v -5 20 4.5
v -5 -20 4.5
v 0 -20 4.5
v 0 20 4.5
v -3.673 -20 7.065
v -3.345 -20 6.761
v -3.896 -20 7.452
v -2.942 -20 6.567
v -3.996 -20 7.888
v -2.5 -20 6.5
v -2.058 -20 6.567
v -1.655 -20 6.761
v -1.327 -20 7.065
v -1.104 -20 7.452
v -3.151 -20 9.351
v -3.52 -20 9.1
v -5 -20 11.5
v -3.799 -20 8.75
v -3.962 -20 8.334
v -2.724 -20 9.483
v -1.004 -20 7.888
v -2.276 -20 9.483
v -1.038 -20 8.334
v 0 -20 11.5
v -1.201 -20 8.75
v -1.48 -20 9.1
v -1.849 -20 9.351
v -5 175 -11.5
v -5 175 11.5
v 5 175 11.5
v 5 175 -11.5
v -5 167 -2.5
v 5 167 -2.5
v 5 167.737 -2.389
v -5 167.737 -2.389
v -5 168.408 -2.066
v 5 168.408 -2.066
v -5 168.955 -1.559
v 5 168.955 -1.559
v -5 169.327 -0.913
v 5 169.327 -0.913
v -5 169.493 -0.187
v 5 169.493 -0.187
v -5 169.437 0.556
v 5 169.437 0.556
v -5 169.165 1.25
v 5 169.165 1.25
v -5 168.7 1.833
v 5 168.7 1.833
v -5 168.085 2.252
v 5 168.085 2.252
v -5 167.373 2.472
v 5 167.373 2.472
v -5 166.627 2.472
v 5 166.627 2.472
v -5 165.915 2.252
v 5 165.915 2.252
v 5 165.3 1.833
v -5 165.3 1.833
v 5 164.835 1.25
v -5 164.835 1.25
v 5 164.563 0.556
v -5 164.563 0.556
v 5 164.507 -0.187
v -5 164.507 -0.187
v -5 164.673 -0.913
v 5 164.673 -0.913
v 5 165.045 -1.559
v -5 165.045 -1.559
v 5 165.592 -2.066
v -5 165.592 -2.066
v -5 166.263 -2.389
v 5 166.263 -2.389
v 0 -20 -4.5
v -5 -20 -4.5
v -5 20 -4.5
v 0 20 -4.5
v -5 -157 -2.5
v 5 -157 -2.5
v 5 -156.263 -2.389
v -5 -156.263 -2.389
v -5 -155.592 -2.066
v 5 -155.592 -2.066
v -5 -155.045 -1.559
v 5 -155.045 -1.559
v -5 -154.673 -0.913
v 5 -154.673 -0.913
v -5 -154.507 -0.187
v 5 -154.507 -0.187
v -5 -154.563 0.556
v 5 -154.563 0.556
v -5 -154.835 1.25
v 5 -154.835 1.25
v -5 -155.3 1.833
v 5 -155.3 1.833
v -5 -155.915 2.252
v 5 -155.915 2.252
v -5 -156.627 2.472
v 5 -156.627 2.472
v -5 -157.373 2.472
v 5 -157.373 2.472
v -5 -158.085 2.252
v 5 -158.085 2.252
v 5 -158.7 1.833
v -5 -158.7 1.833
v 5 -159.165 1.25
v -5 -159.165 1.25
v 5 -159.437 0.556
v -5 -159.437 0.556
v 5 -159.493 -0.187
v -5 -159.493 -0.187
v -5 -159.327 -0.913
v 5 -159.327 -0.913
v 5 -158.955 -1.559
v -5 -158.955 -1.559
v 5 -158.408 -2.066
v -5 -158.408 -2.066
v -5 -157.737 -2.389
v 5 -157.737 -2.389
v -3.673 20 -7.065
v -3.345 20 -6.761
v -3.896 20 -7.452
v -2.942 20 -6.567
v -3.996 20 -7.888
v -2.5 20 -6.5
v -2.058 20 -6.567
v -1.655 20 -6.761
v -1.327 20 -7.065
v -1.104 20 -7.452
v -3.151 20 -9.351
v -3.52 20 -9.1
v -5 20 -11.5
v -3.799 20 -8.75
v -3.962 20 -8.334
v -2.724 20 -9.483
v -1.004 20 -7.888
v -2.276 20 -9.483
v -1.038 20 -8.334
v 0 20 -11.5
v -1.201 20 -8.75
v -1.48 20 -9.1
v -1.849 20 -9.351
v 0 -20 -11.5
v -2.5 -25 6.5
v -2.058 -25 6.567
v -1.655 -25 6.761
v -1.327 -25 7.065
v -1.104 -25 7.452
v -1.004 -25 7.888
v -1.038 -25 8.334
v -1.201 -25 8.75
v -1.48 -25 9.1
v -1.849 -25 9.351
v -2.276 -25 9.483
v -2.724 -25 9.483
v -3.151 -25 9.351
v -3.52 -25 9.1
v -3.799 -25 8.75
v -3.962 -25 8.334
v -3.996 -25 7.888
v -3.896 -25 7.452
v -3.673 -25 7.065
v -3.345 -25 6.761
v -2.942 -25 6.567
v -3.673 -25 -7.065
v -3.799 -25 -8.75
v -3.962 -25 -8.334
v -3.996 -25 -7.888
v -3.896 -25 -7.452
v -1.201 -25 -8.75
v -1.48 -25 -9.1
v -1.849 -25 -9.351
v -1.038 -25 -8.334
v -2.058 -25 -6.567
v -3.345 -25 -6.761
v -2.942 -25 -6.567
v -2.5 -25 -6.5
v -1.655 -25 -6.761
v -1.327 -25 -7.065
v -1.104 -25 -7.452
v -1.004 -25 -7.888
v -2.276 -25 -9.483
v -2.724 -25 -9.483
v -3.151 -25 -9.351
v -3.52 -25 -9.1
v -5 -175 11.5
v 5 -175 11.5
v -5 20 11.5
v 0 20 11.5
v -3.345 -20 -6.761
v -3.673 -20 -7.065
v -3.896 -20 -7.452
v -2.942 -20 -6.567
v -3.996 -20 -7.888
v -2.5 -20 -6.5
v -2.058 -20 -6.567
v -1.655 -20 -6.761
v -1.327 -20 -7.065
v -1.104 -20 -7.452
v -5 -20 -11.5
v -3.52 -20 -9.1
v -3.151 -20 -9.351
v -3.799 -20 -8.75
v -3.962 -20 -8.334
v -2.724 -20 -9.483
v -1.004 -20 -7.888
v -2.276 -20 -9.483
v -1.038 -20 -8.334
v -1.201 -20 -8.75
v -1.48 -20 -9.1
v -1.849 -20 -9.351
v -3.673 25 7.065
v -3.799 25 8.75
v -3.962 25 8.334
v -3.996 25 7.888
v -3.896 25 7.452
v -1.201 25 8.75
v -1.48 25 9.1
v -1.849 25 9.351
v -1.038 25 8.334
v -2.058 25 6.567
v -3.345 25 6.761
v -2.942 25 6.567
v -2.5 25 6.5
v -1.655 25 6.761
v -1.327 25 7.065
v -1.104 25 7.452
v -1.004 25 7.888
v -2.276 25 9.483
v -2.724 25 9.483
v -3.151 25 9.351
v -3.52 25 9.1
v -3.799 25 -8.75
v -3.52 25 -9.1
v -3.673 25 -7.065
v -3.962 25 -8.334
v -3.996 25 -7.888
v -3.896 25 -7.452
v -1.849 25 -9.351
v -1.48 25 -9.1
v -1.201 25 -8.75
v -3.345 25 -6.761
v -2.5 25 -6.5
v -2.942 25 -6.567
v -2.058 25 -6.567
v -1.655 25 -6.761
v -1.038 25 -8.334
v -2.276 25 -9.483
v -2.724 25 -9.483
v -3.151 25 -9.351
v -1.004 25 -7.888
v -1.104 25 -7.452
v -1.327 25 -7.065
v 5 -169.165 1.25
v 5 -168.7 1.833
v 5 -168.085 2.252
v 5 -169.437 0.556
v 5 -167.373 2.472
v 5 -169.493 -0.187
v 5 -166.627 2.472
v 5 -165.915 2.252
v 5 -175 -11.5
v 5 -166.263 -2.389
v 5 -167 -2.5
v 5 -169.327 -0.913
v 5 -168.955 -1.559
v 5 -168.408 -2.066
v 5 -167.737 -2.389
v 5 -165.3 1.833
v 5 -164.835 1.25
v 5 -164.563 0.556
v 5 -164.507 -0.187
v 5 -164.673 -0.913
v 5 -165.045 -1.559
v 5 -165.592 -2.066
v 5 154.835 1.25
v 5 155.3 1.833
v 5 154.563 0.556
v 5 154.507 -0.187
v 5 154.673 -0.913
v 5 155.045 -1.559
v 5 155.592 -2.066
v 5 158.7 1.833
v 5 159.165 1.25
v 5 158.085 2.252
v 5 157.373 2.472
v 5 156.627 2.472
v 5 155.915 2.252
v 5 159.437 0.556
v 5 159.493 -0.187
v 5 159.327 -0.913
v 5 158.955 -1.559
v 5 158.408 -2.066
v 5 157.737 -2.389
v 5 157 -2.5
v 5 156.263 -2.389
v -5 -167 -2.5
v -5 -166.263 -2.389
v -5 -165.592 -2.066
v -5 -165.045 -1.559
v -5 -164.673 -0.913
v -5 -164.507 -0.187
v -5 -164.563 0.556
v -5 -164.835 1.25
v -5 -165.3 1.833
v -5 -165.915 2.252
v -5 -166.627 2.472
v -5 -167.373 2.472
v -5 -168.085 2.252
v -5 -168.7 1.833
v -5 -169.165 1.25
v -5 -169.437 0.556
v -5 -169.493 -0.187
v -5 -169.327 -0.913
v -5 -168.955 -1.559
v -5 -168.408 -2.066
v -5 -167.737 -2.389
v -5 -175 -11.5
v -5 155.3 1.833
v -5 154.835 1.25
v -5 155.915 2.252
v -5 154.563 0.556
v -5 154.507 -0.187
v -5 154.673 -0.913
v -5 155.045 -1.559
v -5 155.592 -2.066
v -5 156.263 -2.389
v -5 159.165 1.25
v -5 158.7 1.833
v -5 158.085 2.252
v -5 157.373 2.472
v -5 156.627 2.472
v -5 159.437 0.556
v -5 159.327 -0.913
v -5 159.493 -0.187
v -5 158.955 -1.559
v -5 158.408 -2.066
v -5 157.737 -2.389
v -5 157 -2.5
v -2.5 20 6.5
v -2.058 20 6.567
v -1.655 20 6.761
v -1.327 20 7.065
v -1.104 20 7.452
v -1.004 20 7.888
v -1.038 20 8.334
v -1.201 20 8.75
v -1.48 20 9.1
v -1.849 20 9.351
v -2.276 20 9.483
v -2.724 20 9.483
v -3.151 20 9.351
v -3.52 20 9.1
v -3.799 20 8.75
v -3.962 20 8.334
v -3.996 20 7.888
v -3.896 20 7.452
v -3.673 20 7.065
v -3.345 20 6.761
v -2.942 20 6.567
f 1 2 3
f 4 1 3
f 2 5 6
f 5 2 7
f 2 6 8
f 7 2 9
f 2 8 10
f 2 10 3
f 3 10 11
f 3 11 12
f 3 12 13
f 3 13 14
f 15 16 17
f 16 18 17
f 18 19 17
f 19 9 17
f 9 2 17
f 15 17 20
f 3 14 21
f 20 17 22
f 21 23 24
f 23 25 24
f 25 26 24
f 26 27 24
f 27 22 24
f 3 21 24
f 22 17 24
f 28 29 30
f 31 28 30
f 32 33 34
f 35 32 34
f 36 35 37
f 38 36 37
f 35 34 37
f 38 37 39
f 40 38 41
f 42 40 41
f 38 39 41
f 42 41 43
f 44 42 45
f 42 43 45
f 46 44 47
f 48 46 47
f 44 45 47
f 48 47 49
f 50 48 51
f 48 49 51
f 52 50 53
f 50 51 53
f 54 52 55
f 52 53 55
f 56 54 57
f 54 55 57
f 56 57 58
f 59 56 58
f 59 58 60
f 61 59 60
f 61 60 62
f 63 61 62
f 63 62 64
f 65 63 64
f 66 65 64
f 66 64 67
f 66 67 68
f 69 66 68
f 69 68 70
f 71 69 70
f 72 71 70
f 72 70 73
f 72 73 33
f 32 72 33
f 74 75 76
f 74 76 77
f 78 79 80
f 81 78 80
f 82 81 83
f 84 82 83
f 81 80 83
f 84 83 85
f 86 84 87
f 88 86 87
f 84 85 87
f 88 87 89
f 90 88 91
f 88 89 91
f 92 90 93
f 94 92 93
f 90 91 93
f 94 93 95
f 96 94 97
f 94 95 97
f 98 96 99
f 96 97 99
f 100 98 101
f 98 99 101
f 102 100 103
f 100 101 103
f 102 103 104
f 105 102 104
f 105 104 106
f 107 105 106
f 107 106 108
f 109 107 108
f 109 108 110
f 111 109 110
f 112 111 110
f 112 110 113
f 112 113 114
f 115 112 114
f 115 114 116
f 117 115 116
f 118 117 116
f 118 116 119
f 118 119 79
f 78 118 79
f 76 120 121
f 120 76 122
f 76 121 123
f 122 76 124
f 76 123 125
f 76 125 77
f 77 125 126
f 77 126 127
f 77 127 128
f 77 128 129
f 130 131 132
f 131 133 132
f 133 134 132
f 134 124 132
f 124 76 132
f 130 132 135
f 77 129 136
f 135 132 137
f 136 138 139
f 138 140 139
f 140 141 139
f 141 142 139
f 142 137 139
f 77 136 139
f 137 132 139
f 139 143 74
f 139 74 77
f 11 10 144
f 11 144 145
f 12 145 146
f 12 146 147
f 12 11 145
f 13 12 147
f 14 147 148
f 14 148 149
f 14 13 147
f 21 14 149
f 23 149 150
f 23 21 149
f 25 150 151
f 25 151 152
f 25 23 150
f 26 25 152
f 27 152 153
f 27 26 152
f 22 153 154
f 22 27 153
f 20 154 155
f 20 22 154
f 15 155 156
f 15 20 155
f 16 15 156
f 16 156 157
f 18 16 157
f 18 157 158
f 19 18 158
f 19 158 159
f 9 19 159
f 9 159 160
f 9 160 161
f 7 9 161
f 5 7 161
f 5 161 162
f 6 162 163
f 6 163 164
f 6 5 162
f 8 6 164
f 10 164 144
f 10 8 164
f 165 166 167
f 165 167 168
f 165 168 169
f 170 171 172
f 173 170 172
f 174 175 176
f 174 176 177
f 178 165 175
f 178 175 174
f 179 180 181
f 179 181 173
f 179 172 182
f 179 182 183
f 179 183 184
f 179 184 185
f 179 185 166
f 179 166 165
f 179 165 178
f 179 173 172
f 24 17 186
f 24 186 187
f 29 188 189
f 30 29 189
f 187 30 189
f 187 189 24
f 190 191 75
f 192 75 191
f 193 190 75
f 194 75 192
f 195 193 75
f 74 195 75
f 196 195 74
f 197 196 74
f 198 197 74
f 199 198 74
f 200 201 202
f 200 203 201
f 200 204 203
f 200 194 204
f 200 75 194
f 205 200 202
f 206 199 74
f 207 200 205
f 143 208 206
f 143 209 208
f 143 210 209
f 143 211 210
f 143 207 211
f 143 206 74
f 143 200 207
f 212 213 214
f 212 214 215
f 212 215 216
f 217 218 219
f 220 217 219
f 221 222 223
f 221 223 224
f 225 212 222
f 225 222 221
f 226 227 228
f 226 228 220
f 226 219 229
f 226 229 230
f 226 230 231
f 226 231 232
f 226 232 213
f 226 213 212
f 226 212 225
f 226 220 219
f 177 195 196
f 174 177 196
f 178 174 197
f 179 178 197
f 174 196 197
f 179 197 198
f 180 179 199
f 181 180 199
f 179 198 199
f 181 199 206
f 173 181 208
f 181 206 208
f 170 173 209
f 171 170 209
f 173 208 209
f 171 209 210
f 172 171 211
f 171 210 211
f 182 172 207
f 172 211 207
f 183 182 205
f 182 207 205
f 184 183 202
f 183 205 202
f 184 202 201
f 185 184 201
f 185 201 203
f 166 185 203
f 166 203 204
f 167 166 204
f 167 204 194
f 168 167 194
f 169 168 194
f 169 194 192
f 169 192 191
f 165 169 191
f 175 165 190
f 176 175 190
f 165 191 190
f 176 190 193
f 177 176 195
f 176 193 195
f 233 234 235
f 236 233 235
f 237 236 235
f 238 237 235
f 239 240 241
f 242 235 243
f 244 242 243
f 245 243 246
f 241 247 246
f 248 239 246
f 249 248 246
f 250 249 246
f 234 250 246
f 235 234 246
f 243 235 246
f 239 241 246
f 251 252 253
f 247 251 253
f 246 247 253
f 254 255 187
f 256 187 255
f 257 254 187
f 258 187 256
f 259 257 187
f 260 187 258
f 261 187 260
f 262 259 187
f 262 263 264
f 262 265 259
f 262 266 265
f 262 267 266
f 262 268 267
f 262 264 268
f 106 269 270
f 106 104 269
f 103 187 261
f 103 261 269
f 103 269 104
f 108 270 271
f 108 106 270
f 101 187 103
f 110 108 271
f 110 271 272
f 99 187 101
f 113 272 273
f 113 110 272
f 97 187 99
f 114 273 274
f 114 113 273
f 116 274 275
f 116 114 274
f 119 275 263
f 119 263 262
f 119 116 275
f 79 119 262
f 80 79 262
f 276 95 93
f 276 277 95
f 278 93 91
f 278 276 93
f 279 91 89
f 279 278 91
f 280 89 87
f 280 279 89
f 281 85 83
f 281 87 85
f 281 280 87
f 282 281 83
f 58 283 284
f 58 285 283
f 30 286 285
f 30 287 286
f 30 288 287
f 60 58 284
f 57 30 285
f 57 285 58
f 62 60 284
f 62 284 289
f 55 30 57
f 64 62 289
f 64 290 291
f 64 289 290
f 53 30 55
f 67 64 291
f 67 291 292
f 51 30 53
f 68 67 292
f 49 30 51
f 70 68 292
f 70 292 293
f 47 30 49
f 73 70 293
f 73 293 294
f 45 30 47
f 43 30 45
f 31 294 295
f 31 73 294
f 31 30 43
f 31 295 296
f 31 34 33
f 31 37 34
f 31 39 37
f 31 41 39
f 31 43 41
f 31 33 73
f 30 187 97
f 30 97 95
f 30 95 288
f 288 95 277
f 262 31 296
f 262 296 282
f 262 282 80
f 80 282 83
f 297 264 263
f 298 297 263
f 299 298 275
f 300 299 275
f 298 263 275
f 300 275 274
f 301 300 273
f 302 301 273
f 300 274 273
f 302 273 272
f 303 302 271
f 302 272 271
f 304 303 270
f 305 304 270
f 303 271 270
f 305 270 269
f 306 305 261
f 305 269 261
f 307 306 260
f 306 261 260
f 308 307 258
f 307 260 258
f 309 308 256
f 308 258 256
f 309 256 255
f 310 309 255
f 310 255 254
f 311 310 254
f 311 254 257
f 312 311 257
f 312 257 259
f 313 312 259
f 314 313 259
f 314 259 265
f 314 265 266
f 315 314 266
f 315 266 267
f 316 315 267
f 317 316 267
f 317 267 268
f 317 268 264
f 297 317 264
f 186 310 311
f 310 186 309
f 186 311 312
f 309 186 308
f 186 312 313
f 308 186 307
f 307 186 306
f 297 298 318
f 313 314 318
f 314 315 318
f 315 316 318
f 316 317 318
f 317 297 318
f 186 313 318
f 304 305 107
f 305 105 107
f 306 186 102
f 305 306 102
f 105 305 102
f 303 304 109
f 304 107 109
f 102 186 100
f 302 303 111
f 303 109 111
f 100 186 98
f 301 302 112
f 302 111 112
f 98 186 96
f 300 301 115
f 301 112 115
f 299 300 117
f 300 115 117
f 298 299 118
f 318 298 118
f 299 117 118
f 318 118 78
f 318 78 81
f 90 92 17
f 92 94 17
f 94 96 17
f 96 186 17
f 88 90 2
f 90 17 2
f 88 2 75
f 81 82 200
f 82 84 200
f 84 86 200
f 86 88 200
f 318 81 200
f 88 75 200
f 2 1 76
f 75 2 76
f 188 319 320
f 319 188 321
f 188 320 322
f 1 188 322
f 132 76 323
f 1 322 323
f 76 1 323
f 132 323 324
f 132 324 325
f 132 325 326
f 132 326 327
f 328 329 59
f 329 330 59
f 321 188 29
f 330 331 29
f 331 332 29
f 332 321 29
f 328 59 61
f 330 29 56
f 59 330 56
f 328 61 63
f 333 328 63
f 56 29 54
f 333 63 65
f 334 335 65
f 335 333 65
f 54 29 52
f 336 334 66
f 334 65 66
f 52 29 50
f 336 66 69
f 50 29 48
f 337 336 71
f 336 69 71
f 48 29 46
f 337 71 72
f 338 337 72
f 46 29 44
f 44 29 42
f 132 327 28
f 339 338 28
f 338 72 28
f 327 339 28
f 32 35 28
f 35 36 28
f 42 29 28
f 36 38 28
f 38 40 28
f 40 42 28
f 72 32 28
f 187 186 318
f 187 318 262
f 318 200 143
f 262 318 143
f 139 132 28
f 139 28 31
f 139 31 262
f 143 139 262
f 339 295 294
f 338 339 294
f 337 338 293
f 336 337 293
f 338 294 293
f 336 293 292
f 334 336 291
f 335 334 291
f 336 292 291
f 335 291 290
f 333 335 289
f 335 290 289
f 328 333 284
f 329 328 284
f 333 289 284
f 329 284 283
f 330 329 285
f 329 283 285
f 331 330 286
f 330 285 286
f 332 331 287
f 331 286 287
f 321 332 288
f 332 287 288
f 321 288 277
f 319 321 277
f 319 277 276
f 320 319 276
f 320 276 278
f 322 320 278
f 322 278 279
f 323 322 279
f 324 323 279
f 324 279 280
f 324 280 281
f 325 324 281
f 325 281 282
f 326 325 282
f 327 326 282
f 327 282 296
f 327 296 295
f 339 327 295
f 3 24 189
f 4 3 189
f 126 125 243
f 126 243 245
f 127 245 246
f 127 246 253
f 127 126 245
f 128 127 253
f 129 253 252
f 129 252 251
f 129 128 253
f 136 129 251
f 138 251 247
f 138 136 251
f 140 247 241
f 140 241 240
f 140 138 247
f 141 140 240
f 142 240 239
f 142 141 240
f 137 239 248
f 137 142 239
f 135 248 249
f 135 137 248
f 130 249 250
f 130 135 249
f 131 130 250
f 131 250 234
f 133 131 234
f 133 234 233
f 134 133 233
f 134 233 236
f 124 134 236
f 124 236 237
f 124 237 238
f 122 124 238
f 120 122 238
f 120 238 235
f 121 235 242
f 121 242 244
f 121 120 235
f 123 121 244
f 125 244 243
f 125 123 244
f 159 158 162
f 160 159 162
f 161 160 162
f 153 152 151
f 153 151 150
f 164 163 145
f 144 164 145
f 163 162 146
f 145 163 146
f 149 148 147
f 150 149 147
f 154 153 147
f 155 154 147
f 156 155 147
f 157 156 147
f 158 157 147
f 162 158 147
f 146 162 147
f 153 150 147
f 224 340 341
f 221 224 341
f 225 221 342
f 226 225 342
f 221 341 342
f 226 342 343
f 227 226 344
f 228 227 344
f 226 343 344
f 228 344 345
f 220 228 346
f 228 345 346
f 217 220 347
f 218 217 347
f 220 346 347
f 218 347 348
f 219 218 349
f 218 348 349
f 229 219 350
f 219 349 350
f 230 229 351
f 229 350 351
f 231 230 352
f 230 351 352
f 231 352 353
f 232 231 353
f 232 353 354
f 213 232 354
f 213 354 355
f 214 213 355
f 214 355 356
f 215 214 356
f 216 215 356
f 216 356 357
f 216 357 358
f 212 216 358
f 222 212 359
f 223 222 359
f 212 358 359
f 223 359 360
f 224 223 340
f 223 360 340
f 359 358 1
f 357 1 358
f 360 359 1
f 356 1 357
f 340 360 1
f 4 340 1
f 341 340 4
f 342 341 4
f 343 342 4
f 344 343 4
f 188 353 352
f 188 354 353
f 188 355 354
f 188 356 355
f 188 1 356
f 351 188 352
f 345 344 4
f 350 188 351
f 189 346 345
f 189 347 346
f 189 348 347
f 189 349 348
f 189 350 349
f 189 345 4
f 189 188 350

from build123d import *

# Parameters (mm, degrees)
SKETCH2_W               = 10
SKETCH2_H               = 23
BOSS_EXTRUDE1_DEPTH     = 175
SKETCH3_R               = 2.5
CUT_EXTRUDE1_DEPTH      = 176.662318099
SKETCH5_R               = 2.5
CUT_EXTRUDE2_DEPTH      = 176.662318099
SKETCH6_W               = 5
SKETCH6_H               = 40
CUT_EXTRUDE3_DEPTH      = 7
SKETCH7_R               = 1.5
CUT_EXTRUDE6_DEPTH      = 5
MIRROR2_COPY_1_SKETCH_R = 1.5
MIRROR2_COPY_1_DEPTH    = 5


with BuildPart() as part:
    # Sketch2 → Boss-Extrude1 (new, symmetric)
    with BuildSketch(Plane(origin=(0, 0, 0), x_dir=(1, 0, 0), z_dir=(0, 1, 0))):
        Rectangle(SKETCH2_W, SKETCH2_H)
    extrude(amount=BOSS_EXTRUDE1_DEPTH, both=True)

    # Sketch3 → Cut-Extrude1 (cut, through all)
    with BuildSketch(Plane(origin=(5, 0, 0), x_dir=(0, 0, -1), z_dir=(1, 0, 0))):
        with Locations((0, 167)):
            Circle(SKETCH3_R)
        with Locations((0, 157)):
            Circle(SKETCH3_R)
    extrude(amount=-CUT_EXTRUDE1_DEPTH, mode=Mode.SUBTRACT)

    # Sketch5 → Cut-Extrude2 (cut, through all)
    with BuildSketch(Plane(origin=(5, 0, 0), x_dir=(0, 0, -1), z_dir=(1, 0, 0))):
        with Locations((0, -167)):
            Circle(SKETCH5_R)
        with Locations((0, -157)):
            Circle(SKETCH5_R)
    extrude(amount=-CUT_EXTRUDE2_DEPTH, mode=Mode.SUBTRACT)

    # Sketch6 → Cut-Extrude3 (cut)
    with BuildSketch(Plane.XY.offset(11.5)):
        with Locations((-2.5, 0)):
            Rectangle(SKETCH6_W, SKETCH6_H)
    cut_extrude3 = extrude(amount=-CUT_EXTRUDE3_DEPTH, mode=Mode.SUBTRACT)

    # Sketch7 → Cut-Extrude6 (cut)
    with BuildSketch(Plane.XZ.offset(-20)):
        with Locations(Location((-2.5, 8, 0), (0, 0, 270))):
            Circle(SKETCH7_R)
    cut_extrude6 = extrude(amount=-CUT_EXTRUDE6_DEPTH, mode=Mode.SUBTRACT)

    # Mirror1: Cut-Extrude6 across plane
    add(cut_extrude6.mirror(Plane(origin=(0, 0, 0), x_dir=(0, 0, 1), z_dir=(0, -1, 0))), mode=Mode.SUBTRACT)

    # Mirror2: Cut-Extrude3, Cut-Extrude6 across plane
    add(cut_extrude3.mirror(Plane.XY), mode=Mode.SUBTRACT)
    add(cut_extrude6.mirror(Plane.XY), mode=Mode.SUBTRACT)

    # Mirror2 copy 1 sketch → Mirror2 copy 1 (cut)
    with BuildSketch(Plane(origin=(0, -20, 0), x_dir=(1, 0, 0), z_dir=(0, 1, 0))):
        with Locations(Location((-2.5, 8, 0), (0, 0, 270))):
            Circle(MIRROR2_COPY_1_SKETCH_R)
    extrude(amount=-MIRROR2_COPY_1_DEPTH, mode=Mode.SUBTRACT)


solid = part.part
